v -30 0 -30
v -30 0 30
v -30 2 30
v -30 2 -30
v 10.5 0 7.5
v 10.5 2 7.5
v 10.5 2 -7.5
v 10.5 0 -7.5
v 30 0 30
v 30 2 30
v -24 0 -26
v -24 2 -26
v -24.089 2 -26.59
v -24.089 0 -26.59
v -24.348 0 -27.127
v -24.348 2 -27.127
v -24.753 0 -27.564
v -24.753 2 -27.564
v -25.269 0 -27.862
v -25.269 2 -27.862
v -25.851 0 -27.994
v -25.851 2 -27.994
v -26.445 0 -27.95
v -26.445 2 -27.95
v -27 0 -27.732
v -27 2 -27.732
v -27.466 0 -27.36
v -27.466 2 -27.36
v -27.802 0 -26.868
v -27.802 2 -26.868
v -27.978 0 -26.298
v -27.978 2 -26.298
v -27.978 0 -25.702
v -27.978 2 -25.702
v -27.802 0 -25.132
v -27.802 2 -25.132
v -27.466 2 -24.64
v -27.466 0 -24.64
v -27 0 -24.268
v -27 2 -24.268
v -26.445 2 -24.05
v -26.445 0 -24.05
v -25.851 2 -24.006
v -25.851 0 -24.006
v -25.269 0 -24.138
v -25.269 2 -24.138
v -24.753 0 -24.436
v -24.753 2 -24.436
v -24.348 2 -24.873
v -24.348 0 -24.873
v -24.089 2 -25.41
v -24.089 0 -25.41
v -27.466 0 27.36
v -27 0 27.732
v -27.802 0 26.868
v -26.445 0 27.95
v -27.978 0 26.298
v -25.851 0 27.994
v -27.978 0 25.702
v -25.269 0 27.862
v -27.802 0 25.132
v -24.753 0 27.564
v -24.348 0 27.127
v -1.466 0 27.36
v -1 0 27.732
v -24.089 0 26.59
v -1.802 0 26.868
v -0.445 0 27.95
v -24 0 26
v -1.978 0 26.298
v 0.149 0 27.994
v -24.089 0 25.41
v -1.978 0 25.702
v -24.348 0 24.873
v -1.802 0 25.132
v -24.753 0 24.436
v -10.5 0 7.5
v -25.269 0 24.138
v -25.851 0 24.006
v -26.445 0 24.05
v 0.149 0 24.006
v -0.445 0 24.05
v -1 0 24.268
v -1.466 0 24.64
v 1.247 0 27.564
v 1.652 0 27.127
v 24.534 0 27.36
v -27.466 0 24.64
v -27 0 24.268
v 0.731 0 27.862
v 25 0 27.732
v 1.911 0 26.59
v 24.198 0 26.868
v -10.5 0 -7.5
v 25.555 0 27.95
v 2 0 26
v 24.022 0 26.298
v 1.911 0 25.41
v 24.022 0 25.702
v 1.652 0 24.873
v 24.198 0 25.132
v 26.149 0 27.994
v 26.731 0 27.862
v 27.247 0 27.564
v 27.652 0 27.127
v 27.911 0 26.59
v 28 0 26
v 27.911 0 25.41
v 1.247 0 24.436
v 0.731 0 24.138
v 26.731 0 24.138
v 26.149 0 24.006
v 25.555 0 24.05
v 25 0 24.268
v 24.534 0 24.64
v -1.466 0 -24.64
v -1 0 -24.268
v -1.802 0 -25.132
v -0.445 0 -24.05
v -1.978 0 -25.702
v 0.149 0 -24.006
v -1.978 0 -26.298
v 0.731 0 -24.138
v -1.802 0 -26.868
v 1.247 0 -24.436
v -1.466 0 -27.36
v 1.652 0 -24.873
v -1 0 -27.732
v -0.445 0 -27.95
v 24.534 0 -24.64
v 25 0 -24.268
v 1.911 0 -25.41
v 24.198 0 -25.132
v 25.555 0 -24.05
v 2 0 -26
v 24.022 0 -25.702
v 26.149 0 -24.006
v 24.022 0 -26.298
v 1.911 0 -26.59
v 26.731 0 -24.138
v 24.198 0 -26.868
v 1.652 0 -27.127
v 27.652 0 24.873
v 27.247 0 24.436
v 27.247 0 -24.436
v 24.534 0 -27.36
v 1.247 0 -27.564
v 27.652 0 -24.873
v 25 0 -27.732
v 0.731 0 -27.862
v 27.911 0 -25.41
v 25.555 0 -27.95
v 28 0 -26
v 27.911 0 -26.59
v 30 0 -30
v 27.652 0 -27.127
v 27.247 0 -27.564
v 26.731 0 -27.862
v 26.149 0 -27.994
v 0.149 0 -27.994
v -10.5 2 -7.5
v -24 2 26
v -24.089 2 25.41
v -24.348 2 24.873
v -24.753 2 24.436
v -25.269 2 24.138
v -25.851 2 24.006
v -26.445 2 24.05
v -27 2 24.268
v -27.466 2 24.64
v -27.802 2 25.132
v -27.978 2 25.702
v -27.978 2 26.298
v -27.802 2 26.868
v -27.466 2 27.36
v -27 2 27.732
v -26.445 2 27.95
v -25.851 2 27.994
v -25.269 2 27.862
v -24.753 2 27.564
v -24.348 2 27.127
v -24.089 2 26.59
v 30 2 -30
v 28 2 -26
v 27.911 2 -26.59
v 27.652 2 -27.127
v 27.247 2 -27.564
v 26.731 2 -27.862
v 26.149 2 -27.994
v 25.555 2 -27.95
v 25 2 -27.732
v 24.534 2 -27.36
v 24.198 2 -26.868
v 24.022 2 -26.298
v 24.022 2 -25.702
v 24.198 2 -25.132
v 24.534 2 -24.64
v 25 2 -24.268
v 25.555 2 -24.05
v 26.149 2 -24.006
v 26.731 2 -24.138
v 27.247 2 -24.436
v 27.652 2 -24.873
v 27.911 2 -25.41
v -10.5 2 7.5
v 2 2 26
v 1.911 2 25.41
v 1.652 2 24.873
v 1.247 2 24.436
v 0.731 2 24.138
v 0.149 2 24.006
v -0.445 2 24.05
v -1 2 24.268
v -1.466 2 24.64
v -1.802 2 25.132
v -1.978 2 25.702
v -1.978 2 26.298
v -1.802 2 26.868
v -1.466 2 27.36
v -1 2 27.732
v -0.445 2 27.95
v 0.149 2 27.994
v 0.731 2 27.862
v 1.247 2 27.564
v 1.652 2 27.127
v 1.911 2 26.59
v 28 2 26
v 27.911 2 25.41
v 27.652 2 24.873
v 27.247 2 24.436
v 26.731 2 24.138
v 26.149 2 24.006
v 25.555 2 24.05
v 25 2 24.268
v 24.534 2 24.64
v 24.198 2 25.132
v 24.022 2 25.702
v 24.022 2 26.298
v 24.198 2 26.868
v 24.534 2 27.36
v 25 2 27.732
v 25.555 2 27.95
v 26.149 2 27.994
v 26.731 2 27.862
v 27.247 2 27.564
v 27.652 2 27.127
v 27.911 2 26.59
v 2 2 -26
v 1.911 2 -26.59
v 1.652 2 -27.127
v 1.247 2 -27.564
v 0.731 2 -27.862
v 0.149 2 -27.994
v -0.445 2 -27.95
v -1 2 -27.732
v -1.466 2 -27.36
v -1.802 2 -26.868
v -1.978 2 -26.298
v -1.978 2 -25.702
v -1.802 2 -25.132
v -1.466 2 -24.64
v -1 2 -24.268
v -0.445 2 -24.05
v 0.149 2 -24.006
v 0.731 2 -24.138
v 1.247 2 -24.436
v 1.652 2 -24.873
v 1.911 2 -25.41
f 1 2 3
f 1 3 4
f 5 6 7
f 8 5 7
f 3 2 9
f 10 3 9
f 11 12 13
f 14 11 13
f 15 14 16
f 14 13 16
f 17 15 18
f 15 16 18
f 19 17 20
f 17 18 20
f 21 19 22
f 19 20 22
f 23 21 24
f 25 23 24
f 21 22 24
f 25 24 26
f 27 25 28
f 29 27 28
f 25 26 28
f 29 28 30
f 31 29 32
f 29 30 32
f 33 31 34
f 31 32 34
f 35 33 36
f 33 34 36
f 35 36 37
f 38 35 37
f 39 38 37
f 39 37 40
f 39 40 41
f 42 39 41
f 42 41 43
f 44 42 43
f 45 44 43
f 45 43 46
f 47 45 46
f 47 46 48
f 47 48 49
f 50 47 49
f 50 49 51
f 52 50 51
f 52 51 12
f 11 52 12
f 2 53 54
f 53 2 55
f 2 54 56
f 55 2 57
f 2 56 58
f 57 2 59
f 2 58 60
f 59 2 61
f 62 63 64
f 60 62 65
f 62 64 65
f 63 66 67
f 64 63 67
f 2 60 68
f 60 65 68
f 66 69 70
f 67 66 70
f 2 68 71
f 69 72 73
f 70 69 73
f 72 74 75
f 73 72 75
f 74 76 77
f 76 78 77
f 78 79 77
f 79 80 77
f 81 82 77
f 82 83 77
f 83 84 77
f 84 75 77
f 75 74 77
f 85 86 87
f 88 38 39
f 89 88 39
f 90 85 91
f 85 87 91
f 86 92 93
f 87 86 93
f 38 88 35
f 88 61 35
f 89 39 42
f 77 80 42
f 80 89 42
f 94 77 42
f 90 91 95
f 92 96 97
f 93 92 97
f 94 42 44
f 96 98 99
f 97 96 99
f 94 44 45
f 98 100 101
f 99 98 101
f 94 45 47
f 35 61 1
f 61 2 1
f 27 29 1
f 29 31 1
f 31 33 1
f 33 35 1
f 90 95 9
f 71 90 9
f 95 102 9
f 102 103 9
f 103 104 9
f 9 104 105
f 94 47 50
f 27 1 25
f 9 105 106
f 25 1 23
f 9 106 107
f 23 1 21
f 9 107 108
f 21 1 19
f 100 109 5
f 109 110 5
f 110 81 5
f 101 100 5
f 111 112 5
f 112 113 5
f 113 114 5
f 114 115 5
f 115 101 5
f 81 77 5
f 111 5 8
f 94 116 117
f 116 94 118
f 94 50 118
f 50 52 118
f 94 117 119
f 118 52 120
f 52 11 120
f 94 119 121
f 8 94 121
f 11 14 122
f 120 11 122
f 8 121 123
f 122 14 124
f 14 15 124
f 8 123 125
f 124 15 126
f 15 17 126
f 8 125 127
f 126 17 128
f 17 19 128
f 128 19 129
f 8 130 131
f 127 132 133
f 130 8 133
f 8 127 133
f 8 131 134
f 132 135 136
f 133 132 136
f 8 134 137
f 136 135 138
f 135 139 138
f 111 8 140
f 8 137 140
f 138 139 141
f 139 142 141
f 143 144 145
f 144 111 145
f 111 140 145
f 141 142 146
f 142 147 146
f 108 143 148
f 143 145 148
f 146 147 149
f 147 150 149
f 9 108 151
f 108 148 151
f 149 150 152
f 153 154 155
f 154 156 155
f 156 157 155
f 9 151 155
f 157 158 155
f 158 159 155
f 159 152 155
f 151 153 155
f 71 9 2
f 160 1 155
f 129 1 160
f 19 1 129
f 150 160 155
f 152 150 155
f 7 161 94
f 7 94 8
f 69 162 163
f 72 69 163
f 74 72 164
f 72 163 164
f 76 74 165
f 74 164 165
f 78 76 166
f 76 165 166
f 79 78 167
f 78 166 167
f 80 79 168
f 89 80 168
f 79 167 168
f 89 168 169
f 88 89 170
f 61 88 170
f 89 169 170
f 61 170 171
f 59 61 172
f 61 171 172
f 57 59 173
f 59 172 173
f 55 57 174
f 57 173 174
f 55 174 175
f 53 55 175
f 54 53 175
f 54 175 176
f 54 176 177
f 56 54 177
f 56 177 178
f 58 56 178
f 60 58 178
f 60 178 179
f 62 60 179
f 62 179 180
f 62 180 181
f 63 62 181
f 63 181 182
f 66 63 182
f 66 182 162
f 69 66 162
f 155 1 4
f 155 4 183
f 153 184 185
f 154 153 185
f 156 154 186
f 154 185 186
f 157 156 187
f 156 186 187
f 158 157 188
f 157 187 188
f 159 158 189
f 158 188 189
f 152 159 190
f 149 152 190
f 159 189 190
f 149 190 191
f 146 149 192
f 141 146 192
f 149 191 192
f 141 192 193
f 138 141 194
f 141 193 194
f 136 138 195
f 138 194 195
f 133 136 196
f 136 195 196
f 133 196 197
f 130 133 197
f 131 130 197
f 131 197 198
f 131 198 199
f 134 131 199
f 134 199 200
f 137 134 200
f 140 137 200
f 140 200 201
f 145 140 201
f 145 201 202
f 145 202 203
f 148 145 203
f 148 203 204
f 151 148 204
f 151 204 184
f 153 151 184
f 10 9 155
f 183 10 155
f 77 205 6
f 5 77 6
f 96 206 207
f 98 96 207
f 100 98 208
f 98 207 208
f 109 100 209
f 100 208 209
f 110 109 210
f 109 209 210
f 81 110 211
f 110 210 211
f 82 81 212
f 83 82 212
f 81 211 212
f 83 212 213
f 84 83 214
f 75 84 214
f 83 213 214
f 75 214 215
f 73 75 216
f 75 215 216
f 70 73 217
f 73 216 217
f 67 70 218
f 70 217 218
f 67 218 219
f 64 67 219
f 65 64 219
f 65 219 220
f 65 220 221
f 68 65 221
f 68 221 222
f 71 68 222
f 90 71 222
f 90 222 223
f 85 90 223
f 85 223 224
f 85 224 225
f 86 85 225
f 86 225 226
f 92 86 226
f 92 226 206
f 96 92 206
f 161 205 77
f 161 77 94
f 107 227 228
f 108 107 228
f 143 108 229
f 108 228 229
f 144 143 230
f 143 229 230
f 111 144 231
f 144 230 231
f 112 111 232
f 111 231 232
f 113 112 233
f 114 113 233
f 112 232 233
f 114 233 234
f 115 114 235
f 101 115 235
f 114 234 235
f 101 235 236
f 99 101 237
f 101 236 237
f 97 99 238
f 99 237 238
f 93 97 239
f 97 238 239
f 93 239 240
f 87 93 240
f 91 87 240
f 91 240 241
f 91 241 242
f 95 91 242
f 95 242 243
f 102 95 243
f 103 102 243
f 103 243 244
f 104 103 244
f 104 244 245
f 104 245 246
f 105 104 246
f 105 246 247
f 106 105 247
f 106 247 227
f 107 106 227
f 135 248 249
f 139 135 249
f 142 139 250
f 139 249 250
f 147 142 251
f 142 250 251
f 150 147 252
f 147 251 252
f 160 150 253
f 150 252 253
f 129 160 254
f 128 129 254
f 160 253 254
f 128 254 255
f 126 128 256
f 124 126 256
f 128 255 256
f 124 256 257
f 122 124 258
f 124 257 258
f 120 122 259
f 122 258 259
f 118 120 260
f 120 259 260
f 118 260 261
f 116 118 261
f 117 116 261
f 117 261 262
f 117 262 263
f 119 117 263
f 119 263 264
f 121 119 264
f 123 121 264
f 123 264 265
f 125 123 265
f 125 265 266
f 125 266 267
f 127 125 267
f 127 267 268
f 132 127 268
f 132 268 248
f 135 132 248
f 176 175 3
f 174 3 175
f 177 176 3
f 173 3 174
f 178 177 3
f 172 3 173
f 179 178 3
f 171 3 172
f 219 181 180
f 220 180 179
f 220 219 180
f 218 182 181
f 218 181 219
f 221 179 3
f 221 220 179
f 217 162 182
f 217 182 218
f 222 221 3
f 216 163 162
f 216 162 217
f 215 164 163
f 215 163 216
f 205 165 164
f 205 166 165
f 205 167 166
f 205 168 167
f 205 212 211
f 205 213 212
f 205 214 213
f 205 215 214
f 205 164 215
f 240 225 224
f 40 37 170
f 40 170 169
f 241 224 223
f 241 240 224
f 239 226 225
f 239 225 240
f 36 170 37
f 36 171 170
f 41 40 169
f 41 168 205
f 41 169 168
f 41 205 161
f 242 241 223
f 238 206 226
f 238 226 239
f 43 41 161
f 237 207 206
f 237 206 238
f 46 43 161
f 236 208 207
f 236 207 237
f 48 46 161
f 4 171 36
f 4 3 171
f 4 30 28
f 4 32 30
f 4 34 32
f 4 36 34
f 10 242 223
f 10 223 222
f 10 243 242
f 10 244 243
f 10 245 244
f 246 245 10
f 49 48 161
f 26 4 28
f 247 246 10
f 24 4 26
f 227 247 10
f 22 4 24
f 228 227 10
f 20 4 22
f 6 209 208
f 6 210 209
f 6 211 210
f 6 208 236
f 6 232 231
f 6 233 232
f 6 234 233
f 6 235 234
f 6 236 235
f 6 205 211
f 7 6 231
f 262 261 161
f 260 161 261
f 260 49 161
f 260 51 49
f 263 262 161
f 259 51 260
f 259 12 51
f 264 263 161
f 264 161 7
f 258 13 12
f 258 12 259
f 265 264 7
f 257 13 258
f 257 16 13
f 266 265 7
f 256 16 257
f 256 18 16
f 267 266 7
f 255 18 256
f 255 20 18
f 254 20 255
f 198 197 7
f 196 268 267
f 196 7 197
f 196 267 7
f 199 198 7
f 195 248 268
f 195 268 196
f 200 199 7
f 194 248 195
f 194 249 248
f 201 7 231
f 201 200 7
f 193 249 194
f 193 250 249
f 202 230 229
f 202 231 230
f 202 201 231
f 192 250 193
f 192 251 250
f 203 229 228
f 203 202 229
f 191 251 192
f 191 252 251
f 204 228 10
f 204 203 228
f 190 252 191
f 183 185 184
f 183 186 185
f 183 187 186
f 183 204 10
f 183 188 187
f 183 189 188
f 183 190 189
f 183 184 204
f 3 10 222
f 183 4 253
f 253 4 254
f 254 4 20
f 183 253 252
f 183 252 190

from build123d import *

# Parameters (mm, degrees)
SKETCH1_W           = 60
SKETCH1_H           = 60
BOSS_EXTRUDE1_DEPTH = 2
SKETCH2_R           = 2
CUT_EXTRUDE1_DEPTH  = 3
SKETCH3_W           = 21
SKETCH3_H           = 15
CUT_EXTRUDE2_DEPTH  = 2


with BuildPart() as part:
    # Sketch1 → Boss-Extrude1 (new body)
    with BuildSketch(Plane(origin=(0, 0, 0), x_dir=(1, 0, 0), z_dir=(0, 1, 0))):
        Rectangle(SKETCH1_W, SKETCH1_H)
    extrude(amount=BOSS_EXTRUDE1_DEPTH)

    # Sketch2 → Cut-Extrude1 (cut, through all)
    with BuildSketch(Plane(origin=(0, 2, 0), x_dir=(1, 0, 0), z_dir=(0, 1, 0))):
        with Locations((-26, 26)):
            Circle(SKETCH2_R)
        with Locations((0, 26)):
            Circle(SKETCH2_R)
        with Locations((26, 26)):
            Circle(SKETCH2_R)
        with Locations((26, -26)):
            Circle(SKETCH2_R)
        with Locations((0, -26)):
            Circle(SKETCH2_R)
        with Locations((-26, -26)):
            Circle(SKETCH2_R)
    extrude(amount=-CUT_EXTRUDE1_DEPTH, mode=Mode.SUBTRACT)

    # Sketch3 → Cut-Extrude2 (cut)
    with BuildSketch(Plane(origin=(0, 2, 0), x_dir=(1, 0, 0), z_dir=(0, 1, 0))):
        Rectangle(SKETCH3_W, SKETCH3_H)
    extrude(amount=-CUT_EXTRUDE2_DEPTH, mode=Mode.SUBTRACT)


solid = part.part
